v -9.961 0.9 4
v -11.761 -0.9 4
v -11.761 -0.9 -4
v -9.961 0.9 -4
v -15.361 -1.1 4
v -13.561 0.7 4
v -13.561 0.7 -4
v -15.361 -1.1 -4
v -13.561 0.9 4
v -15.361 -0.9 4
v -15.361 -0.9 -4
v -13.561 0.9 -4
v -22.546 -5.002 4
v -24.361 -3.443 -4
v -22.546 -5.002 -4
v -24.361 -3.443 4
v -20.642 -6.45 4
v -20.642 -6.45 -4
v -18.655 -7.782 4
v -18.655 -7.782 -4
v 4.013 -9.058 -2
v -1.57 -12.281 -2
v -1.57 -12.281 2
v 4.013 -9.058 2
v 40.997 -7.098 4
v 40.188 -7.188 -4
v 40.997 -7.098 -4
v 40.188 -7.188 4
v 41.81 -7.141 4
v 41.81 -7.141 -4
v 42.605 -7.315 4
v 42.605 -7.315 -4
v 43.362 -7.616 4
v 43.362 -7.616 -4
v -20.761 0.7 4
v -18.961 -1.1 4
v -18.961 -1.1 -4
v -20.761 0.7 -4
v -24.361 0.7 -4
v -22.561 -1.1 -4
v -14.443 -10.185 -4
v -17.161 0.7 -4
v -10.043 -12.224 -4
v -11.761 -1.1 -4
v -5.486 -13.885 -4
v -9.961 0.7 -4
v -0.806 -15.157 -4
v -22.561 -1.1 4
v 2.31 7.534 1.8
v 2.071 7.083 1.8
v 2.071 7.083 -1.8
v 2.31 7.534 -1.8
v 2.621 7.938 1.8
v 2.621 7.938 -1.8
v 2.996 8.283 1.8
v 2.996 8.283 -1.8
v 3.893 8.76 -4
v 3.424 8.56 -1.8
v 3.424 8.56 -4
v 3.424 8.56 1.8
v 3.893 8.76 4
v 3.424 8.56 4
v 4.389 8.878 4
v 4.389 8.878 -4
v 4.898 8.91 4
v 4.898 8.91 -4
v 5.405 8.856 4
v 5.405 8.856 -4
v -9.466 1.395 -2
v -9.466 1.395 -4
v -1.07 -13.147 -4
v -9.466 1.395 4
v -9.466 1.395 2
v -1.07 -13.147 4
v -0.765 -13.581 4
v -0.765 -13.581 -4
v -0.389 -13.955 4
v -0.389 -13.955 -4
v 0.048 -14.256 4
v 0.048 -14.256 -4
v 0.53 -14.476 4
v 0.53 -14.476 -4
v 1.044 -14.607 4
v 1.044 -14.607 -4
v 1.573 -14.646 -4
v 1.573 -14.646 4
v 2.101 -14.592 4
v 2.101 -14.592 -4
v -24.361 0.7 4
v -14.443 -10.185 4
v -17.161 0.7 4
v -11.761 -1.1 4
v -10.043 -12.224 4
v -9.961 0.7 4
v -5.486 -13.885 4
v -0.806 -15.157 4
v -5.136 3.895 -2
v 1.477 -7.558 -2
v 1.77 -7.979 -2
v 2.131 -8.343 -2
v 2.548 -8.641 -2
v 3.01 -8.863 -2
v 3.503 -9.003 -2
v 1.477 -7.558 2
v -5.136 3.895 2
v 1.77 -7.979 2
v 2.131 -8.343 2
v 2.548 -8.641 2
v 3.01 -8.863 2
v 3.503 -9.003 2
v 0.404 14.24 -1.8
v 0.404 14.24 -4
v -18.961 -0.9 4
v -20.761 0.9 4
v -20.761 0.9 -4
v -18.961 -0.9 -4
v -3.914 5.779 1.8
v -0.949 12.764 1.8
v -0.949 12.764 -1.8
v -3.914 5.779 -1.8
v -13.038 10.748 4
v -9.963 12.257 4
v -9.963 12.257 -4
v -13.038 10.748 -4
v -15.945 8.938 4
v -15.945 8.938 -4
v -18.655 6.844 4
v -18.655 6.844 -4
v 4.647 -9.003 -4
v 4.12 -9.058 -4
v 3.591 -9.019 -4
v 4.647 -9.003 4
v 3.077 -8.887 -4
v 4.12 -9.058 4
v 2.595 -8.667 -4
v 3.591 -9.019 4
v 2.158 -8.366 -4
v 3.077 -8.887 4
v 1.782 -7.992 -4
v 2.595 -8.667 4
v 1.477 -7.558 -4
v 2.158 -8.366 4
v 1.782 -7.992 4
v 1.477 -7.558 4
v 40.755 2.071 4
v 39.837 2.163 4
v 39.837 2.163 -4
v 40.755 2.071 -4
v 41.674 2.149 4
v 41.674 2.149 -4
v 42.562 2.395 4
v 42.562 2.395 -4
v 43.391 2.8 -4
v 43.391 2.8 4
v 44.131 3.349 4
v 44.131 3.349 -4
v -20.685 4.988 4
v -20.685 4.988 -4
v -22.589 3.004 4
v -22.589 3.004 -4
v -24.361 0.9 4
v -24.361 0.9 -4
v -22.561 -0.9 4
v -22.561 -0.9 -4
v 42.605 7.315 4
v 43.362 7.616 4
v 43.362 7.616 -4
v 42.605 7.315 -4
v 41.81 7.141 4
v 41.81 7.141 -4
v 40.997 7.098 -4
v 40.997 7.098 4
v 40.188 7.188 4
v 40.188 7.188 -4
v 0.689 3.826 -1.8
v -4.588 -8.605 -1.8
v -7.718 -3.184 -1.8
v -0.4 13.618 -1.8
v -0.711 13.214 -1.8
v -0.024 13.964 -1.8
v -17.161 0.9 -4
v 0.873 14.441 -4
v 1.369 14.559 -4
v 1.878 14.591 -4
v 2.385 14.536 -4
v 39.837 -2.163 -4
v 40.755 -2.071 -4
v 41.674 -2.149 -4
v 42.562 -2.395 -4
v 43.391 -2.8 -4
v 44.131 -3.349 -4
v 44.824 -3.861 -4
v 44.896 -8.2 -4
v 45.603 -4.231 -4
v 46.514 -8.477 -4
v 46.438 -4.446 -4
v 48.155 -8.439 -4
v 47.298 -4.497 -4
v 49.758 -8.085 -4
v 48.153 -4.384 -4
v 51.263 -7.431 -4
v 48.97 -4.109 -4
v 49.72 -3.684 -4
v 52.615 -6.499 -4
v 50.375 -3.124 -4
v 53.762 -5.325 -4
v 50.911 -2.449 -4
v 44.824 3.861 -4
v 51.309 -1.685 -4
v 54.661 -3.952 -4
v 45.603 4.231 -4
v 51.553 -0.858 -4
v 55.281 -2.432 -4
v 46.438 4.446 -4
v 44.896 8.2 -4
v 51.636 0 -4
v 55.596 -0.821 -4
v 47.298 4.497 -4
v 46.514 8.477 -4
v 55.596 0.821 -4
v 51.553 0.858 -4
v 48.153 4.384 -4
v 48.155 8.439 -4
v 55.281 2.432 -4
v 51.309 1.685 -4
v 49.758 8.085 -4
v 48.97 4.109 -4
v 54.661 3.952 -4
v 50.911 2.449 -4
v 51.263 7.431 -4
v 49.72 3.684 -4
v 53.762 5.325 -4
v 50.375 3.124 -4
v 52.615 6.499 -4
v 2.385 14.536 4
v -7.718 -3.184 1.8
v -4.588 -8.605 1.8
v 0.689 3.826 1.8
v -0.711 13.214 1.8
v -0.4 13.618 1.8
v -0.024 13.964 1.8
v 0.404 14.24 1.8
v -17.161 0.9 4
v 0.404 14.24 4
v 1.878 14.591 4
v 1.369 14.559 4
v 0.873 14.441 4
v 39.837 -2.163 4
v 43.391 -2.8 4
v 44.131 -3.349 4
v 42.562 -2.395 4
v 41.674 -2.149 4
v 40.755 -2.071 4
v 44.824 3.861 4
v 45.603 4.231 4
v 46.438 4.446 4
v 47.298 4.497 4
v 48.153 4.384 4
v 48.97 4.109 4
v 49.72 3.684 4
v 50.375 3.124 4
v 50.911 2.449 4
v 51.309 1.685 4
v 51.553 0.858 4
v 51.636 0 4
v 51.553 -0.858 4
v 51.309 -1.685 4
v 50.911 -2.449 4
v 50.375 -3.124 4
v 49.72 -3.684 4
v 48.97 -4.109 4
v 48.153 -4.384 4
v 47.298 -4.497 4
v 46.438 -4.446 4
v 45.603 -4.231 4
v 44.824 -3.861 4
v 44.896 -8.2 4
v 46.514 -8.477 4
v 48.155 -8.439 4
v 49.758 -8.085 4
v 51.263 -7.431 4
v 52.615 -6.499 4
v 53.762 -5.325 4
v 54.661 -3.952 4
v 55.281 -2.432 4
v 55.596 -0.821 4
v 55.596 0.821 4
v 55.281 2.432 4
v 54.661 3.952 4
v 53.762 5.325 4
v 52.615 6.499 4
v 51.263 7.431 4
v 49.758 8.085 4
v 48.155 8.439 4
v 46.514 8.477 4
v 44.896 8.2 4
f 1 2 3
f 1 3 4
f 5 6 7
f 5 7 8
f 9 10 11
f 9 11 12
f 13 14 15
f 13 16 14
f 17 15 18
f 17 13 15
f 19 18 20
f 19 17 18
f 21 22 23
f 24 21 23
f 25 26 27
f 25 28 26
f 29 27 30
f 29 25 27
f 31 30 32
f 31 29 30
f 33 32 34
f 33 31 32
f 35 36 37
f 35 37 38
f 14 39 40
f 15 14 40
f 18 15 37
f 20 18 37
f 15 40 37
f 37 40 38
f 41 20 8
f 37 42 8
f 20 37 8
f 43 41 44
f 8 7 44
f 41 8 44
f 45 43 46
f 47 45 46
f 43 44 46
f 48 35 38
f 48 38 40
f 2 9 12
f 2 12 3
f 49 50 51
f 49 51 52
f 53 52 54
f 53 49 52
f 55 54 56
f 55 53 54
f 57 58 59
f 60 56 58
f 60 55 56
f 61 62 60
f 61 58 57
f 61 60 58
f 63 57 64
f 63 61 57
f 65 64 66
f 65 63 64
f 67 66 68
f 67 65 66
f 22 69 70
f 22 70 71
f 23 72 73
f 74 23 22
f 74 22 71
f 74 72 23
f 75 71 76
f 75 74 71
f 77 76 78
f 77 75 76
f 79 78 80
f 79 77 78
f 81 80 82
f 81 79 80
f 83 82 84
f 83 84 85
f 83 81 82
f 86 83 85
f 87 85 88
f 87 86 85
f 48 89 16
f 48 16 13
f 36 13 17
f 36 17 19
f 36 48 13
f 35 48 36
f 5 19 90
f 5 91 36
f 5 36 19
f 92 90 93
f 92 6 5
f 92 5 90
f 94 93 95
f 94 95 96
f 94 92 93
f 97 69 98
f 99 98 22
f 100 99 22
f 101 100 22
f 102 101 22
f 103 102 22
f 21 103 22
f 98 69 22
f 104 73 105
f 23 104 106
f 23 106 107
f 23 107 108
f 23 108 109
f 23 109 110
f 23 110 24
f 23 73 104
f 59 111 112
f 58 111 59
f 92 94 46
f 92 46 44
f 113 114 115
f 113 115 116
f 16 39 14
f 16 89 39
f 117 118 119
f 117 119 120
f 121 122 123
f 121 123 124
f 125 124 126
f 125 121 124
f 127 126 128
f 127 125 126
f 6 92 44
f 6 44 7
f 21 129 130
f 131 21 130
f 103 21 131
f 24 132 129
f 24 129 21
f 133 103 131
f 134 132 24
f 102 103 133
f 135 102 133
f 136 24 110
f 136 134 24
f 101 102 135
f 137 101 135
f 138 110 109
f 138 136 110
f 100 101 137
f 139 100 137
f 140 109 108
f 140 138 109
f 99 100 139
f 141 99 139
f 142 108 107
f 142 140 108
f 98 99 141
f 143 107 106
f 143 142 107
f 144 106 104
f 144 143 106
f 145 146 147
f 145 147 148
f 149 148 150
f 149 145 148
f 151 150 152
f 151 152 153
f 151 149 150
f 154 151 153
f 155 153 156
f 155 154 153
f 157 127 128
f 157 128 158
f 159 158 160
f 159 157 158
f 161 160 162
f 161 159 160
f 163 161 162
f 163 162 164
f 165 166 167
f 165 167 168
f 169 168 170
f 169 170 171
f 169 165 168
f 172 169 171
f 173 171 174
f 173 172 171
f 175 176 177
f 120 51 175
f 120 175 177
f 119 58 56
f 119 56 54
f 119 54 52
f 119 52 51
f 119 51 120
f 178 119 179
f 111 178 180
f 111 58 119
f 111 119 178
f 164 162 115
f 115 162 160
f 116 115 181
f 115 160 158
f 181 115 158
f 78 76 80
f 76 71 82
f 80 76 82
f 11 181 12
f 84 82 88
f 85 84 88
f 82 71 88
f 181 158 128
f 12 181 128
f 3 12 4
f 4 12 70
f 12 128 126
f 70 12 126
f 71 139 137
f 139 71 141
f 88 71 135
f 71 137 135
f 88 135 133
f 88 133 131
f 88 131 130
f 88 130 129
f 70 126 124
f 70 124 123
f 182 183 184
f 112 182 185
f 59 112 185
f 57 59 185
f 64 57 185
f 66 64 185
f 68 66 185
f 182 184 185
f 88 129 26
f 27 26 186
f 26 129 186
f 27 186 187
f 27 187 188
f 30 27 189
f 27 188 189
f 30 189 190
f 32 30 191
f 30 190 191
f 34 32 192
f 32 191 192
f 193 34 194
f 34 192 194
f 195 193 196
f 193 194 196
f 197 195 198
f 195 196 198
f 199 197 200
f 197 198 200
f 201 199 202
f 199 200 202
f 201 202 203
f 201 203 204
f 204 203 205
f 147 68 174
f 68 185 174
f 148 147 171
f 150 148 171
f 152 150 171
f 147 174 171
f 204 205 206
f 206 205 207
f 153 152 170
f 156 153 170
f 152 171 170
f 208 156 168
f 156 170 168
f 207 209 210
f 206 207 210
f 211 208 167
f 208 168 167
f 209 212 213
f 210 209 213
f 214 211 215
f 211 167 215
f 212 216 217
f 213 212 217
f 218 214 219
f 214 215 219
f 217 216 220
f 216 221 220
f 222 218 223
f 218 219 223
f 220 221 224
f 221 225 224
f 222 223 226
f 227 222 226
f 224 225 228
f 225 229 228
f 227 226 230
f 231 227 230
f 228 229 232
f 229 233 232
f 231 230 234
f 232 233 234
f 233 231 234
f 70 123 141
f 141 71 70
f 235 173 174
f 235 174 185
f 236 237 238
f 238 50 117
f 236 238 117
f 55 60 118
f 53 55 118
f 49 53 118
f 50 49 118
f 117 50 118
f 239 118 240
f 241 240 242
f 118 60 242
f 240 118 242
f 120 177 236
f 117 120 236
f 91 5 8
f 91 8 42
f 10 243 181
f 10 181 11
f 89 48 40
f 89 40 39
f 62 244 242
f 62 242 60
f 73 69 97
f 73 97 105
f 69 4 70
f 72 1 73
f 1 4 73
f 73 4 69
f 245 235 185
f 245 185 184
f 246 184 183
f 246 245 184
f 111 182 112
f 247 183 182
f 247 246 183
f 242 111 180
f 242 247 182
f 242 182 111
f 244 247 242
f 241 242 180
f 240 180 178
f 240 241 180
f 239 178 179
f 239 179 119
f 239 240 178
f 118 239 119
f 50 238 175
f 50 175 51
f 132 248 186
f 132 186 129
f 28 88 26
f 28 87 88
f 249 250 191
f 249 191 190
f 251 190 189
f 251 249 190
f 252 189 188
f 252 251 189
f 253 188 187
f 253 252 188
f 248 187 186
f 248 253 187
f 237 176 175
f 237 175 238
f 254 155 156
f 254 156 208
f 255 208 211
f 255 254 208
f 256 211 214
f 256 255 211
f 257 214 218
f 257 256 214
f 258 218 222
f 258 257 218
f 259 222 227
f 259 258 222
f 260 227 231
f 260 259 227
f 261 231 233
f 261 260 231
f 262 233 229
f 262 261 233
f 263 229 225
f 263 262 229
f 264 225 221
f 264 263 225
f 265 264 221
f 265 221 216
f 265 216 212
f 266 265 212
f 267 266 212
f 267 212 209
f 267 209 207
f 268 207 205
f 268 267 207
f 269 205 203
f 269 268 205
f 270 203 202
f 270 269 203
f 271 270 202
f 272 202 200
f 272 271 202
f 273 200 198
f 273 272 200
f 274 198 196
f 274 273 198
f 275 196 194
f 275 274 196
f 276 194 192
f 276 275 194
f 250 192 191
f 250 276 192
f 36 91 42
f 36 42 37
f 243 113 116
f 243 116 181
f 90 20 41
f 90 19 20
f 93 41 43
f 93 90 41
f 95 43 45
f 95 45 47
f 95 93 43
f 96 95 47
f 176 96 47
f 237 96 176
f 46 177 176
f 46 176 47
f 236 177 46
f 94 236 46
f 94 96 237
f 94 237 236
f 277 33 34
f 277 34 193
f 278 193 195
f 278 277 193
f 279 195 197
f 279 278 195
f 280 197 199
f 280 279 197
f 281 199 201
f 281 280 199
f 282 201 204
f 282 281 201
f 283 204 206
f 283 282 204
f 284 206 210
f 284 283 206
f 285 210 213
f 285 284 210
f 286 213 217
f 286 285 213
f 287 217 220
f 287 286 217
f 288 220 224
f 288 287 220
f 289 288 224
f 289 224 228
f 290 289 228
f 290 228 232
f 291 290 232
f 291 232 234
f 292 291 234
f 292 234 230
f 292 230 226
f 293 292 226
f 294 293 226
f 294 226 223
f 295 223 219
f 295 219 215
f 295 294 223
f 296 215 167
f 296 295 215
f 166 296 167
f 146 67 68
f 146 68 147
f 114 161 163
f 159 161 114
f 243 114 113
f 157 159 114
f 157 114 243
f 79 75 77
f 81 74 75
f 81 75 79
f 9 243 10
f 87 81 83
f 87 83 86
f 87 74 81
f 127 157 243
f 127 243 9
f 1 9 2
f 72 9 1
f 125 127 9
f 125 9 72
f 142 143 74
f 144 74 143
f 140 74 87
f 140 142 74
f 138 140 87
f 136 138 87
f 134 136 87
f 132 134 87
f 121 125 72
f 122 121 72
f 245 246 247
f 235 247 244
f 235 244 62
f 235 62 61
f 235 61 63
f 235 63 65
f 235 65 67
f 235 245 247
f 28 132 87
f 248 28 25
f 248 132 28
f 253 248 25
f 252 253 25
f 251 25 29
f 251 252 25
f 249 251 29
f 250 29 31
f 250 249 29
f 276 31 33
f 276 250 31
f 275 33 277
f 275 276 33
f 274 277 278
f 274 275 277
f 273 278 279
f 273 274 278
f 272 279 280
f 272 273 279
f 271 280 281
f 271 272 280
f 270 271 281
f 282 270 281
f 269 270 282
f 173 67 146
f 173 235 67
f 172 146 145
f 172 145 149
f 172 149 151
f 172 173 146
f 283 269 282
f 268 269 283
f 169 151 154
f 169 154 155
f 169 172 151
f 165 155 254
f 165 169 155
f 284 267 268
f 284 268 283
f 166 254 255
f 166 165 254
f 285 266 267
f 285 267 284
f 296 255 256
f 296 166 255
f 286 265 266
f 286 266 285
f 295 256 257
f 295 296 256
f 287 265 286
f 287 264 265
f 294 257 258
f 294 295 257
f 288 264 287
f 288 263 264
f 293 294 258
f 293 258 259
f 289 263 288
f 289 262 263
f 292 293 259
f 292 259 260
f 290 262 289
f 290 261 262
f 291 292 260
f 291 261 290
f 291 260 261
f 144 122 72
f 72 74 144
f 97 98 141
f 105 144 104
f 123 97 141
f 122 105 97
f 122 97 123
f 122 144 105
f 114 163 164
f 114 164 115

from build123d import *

# Parameters (mm, degrees)
F1_DEPTH = 4
F2_W     = 15.7914069632
F2_H     = 4
F3_DEPTH = 7
F6_W     = 13.4452040827
F6_H     = 2.2
F7_DEPTH = 8
F8_DEPTH = 14.5045625426


with BuildPart() as f1:
    # F0 (on Top) → F1 (new body, symmetric)
    with BuildSketch(Plane.XY):
        with BuildLine():
            ThreePointArc((40.1879624894, -7.1882514277), (41.8101711711, -7.1412327294), (43.3619882248, -7.6162438838))
            ThreePointArc((43.3619882248, -7.6162438838), (55.6359555142, 0), (43.3619882248, 7.6162438838))
            ThreePointArc((43.3619882248, 7.6162438838), (41.8101711711, 7.1412327294), (40.1879624894, 7.1882514277))
            Line((40.1879624894, 7.1882514277), (2.3847180591, 14.5364577665))
            ThreePointArc((2.3847180591, 14.5364577665), (0.4038763846, 14.2404189947), (-0.9492234874, 12.7637696016))
            Line((-0.9492234874, 12.7637696016), (-3.9139870299, 5.7792243959))
            Line((-3.9139870299, 5.7792243959), (0.6885372374, 3.8255687534))
            Line((0.6885372374, 3.8255687534), (2.0712616343, 7.0830632951))
            ThreePointArc((2.0712616343, 7.0830632951), (3.4243615063, 8.5597126882), (5.4052031808, 8.85575146))
            Line((5.4052031808, 8.85575146), (39.8374709782, 2.1627966012))
            ThreePointArc((39.8374709782, 2.1627966012), (42.1235130158, 2.251618892), (44.1306946704, 3.3493890877))
            ThreePointArc((44.1306946704, 3.3493890877), (51.6359555142, 0), (44.1306946704, -3.3493890877))
            ThreePointArc((44.1306946704, -3.3493890877), (42.1235130158, -2.251618892), (39.8374709782, -2.1627966012))
            Line((39.8374709782, -2.1627966012), (4.6474579448, -9.0030422132))
            ThreePointArc((4.6474579448, -9.0030422132), (2.8309512307, -8.7880444755), (1.4769547473, -7.5581606629))
            Line((1.4769547473, -7.5581606629), (-9.963304434, 12.256949491))
            ThreePointArc((-9.963304434, 12.256949491), (-14.5143086091, 9.879543395), (-18.655423863, 6.8439440802))
            ThreePointArc((-18.655423863, 6.8439440802), (-21.653397971, 4.0115098086), (-24.3606178303, 0.9))
            Line((-24.3606178303, 0.9), (-22.5606178303, -0.9))
            Line((-22.5606178303, -0.9), (-20.7606178303, 0.9))
            Line((-20.7606178303, 0.9), (-18.9606178303, -0.9))
            Line((-18.9606178303, -0.9), (-17.1606178303, 0.9))
            Line((-17.1606178303, 0.9), (-15.3606178303, -0.9))
            Line((-15.3606178303, -0.9), (-13.5606178303, 0.9))
            Line((-13.5606178303, 0.9), (-11.7606178303, -0.9))
            Line((-11.7606178303, -0.9), (-9.9606178303, 0.9))
            Line((-9.9606178303, 0.9), (-9.4656430834, 1.3949747468))
            Line((-9.4656430834, 1.3949747468), (-1.0699396018, -13.1468102486))
            ThreePointArc((-1.0699396018, -13.1468102486), (0.2840568815, -14.3766940612), (2.1005635956, -14.5916917989))
            Line((2.1005635956, -14.5916917989), (40.1879624894, -7.1882514277))
        make_face()
    extrude(amount=F1_DEPTH, both=True)

    # F2 (on face) → F3 (cut)
    with BuildSketch(Plane(origin=(-6.4951905284, -3.75, 0), x_dir=(0.5, -0.8660254038, 0), z_dir=(-0.8660254038, -0.5, 0))):
        with Locations((1.9547983715, 0)):
            Rectangle(F2_W, F2_H)
    extrude(amount=-F3_DEPTH, mode=Mode.SUBTRACT)

    # F6 (on face) → F7 (cut)
    with BuildSketch(Plane(origin=(6.2177817942, 3.306053224, 0), x_dir=(0.4694715628, -0.8829475929, 0), z_dir=(-0.8829475929, -0.4694715628, 0))):
        with Locations((-9.7771301106, -2.9)):
            Rectangle(F6_W, F6_H)
        with Locations((-9.7771301106, 2.9)):
            Rectangle(F6_W, F6_H)
    extrude(amount=F7_DEPTH, mode=Mode.SUBTRACT)

    # F8 (add, up to face): a face of the model
    f8_faces = [f1.faces().sort_by_distance(p)[0] for p in [
        (-1.6127248962, 4.8023965747, 0),
    ]]


with BuildPart() as f1b:
    # F0 (on Top) → F1, piece 2 (new body, symmetric)
    with BuildSketch(Plane.XY):
        with BuildLine():
            ThreePointArc((-18.655423863, -7.7815652767), (-10.0426174907, -12.2242484166), (-0.8057885607, -15.1566294295))
            Line((-0.8057885607, -15.1566294295), (-9.9606178303, 0.7))
            Line((-9.9606178303, 0.7), (-11.7606178303, -1.1))
            Line((-11.7606178303, -1.1), (-13.5606178303, 0.7))
            Line((-13.5606178303, 0.7), (-15.3606178303, -1.1))
            Line((-15.3606178303, -1.1), (-17.1606178303, 0.7))
            Line((-17.1606178303, 0.7), (-18.9606178303, -1.1))
            Line((-18.9606178303, -1.1), (-20.7606178303, 0.7))
            Line((-20.7606178303, 0.7), (-22.5606178303, -1.1))
            Line((-22.5606178303, -1.1), (-24.3606178303, 0.7))
            Line((-24.3606178303, 0.7), (-24.3606178303, -3.443194404))
            ThreePointArc((-24.3606178303, -3.443194404), (-21.6051594937, -5.7401224515), (-18.655423863, -7.7815652767))
        make_face()
    extrude(amount=F1_DEPTH, both=True)


with BuildPart() as f1_1:
    add(f1.part)

    add(f1b.part)  # F8 merges F1b
    extrude(f8_faces, amount=F8_DEPTH)


solid = f1_1.part
